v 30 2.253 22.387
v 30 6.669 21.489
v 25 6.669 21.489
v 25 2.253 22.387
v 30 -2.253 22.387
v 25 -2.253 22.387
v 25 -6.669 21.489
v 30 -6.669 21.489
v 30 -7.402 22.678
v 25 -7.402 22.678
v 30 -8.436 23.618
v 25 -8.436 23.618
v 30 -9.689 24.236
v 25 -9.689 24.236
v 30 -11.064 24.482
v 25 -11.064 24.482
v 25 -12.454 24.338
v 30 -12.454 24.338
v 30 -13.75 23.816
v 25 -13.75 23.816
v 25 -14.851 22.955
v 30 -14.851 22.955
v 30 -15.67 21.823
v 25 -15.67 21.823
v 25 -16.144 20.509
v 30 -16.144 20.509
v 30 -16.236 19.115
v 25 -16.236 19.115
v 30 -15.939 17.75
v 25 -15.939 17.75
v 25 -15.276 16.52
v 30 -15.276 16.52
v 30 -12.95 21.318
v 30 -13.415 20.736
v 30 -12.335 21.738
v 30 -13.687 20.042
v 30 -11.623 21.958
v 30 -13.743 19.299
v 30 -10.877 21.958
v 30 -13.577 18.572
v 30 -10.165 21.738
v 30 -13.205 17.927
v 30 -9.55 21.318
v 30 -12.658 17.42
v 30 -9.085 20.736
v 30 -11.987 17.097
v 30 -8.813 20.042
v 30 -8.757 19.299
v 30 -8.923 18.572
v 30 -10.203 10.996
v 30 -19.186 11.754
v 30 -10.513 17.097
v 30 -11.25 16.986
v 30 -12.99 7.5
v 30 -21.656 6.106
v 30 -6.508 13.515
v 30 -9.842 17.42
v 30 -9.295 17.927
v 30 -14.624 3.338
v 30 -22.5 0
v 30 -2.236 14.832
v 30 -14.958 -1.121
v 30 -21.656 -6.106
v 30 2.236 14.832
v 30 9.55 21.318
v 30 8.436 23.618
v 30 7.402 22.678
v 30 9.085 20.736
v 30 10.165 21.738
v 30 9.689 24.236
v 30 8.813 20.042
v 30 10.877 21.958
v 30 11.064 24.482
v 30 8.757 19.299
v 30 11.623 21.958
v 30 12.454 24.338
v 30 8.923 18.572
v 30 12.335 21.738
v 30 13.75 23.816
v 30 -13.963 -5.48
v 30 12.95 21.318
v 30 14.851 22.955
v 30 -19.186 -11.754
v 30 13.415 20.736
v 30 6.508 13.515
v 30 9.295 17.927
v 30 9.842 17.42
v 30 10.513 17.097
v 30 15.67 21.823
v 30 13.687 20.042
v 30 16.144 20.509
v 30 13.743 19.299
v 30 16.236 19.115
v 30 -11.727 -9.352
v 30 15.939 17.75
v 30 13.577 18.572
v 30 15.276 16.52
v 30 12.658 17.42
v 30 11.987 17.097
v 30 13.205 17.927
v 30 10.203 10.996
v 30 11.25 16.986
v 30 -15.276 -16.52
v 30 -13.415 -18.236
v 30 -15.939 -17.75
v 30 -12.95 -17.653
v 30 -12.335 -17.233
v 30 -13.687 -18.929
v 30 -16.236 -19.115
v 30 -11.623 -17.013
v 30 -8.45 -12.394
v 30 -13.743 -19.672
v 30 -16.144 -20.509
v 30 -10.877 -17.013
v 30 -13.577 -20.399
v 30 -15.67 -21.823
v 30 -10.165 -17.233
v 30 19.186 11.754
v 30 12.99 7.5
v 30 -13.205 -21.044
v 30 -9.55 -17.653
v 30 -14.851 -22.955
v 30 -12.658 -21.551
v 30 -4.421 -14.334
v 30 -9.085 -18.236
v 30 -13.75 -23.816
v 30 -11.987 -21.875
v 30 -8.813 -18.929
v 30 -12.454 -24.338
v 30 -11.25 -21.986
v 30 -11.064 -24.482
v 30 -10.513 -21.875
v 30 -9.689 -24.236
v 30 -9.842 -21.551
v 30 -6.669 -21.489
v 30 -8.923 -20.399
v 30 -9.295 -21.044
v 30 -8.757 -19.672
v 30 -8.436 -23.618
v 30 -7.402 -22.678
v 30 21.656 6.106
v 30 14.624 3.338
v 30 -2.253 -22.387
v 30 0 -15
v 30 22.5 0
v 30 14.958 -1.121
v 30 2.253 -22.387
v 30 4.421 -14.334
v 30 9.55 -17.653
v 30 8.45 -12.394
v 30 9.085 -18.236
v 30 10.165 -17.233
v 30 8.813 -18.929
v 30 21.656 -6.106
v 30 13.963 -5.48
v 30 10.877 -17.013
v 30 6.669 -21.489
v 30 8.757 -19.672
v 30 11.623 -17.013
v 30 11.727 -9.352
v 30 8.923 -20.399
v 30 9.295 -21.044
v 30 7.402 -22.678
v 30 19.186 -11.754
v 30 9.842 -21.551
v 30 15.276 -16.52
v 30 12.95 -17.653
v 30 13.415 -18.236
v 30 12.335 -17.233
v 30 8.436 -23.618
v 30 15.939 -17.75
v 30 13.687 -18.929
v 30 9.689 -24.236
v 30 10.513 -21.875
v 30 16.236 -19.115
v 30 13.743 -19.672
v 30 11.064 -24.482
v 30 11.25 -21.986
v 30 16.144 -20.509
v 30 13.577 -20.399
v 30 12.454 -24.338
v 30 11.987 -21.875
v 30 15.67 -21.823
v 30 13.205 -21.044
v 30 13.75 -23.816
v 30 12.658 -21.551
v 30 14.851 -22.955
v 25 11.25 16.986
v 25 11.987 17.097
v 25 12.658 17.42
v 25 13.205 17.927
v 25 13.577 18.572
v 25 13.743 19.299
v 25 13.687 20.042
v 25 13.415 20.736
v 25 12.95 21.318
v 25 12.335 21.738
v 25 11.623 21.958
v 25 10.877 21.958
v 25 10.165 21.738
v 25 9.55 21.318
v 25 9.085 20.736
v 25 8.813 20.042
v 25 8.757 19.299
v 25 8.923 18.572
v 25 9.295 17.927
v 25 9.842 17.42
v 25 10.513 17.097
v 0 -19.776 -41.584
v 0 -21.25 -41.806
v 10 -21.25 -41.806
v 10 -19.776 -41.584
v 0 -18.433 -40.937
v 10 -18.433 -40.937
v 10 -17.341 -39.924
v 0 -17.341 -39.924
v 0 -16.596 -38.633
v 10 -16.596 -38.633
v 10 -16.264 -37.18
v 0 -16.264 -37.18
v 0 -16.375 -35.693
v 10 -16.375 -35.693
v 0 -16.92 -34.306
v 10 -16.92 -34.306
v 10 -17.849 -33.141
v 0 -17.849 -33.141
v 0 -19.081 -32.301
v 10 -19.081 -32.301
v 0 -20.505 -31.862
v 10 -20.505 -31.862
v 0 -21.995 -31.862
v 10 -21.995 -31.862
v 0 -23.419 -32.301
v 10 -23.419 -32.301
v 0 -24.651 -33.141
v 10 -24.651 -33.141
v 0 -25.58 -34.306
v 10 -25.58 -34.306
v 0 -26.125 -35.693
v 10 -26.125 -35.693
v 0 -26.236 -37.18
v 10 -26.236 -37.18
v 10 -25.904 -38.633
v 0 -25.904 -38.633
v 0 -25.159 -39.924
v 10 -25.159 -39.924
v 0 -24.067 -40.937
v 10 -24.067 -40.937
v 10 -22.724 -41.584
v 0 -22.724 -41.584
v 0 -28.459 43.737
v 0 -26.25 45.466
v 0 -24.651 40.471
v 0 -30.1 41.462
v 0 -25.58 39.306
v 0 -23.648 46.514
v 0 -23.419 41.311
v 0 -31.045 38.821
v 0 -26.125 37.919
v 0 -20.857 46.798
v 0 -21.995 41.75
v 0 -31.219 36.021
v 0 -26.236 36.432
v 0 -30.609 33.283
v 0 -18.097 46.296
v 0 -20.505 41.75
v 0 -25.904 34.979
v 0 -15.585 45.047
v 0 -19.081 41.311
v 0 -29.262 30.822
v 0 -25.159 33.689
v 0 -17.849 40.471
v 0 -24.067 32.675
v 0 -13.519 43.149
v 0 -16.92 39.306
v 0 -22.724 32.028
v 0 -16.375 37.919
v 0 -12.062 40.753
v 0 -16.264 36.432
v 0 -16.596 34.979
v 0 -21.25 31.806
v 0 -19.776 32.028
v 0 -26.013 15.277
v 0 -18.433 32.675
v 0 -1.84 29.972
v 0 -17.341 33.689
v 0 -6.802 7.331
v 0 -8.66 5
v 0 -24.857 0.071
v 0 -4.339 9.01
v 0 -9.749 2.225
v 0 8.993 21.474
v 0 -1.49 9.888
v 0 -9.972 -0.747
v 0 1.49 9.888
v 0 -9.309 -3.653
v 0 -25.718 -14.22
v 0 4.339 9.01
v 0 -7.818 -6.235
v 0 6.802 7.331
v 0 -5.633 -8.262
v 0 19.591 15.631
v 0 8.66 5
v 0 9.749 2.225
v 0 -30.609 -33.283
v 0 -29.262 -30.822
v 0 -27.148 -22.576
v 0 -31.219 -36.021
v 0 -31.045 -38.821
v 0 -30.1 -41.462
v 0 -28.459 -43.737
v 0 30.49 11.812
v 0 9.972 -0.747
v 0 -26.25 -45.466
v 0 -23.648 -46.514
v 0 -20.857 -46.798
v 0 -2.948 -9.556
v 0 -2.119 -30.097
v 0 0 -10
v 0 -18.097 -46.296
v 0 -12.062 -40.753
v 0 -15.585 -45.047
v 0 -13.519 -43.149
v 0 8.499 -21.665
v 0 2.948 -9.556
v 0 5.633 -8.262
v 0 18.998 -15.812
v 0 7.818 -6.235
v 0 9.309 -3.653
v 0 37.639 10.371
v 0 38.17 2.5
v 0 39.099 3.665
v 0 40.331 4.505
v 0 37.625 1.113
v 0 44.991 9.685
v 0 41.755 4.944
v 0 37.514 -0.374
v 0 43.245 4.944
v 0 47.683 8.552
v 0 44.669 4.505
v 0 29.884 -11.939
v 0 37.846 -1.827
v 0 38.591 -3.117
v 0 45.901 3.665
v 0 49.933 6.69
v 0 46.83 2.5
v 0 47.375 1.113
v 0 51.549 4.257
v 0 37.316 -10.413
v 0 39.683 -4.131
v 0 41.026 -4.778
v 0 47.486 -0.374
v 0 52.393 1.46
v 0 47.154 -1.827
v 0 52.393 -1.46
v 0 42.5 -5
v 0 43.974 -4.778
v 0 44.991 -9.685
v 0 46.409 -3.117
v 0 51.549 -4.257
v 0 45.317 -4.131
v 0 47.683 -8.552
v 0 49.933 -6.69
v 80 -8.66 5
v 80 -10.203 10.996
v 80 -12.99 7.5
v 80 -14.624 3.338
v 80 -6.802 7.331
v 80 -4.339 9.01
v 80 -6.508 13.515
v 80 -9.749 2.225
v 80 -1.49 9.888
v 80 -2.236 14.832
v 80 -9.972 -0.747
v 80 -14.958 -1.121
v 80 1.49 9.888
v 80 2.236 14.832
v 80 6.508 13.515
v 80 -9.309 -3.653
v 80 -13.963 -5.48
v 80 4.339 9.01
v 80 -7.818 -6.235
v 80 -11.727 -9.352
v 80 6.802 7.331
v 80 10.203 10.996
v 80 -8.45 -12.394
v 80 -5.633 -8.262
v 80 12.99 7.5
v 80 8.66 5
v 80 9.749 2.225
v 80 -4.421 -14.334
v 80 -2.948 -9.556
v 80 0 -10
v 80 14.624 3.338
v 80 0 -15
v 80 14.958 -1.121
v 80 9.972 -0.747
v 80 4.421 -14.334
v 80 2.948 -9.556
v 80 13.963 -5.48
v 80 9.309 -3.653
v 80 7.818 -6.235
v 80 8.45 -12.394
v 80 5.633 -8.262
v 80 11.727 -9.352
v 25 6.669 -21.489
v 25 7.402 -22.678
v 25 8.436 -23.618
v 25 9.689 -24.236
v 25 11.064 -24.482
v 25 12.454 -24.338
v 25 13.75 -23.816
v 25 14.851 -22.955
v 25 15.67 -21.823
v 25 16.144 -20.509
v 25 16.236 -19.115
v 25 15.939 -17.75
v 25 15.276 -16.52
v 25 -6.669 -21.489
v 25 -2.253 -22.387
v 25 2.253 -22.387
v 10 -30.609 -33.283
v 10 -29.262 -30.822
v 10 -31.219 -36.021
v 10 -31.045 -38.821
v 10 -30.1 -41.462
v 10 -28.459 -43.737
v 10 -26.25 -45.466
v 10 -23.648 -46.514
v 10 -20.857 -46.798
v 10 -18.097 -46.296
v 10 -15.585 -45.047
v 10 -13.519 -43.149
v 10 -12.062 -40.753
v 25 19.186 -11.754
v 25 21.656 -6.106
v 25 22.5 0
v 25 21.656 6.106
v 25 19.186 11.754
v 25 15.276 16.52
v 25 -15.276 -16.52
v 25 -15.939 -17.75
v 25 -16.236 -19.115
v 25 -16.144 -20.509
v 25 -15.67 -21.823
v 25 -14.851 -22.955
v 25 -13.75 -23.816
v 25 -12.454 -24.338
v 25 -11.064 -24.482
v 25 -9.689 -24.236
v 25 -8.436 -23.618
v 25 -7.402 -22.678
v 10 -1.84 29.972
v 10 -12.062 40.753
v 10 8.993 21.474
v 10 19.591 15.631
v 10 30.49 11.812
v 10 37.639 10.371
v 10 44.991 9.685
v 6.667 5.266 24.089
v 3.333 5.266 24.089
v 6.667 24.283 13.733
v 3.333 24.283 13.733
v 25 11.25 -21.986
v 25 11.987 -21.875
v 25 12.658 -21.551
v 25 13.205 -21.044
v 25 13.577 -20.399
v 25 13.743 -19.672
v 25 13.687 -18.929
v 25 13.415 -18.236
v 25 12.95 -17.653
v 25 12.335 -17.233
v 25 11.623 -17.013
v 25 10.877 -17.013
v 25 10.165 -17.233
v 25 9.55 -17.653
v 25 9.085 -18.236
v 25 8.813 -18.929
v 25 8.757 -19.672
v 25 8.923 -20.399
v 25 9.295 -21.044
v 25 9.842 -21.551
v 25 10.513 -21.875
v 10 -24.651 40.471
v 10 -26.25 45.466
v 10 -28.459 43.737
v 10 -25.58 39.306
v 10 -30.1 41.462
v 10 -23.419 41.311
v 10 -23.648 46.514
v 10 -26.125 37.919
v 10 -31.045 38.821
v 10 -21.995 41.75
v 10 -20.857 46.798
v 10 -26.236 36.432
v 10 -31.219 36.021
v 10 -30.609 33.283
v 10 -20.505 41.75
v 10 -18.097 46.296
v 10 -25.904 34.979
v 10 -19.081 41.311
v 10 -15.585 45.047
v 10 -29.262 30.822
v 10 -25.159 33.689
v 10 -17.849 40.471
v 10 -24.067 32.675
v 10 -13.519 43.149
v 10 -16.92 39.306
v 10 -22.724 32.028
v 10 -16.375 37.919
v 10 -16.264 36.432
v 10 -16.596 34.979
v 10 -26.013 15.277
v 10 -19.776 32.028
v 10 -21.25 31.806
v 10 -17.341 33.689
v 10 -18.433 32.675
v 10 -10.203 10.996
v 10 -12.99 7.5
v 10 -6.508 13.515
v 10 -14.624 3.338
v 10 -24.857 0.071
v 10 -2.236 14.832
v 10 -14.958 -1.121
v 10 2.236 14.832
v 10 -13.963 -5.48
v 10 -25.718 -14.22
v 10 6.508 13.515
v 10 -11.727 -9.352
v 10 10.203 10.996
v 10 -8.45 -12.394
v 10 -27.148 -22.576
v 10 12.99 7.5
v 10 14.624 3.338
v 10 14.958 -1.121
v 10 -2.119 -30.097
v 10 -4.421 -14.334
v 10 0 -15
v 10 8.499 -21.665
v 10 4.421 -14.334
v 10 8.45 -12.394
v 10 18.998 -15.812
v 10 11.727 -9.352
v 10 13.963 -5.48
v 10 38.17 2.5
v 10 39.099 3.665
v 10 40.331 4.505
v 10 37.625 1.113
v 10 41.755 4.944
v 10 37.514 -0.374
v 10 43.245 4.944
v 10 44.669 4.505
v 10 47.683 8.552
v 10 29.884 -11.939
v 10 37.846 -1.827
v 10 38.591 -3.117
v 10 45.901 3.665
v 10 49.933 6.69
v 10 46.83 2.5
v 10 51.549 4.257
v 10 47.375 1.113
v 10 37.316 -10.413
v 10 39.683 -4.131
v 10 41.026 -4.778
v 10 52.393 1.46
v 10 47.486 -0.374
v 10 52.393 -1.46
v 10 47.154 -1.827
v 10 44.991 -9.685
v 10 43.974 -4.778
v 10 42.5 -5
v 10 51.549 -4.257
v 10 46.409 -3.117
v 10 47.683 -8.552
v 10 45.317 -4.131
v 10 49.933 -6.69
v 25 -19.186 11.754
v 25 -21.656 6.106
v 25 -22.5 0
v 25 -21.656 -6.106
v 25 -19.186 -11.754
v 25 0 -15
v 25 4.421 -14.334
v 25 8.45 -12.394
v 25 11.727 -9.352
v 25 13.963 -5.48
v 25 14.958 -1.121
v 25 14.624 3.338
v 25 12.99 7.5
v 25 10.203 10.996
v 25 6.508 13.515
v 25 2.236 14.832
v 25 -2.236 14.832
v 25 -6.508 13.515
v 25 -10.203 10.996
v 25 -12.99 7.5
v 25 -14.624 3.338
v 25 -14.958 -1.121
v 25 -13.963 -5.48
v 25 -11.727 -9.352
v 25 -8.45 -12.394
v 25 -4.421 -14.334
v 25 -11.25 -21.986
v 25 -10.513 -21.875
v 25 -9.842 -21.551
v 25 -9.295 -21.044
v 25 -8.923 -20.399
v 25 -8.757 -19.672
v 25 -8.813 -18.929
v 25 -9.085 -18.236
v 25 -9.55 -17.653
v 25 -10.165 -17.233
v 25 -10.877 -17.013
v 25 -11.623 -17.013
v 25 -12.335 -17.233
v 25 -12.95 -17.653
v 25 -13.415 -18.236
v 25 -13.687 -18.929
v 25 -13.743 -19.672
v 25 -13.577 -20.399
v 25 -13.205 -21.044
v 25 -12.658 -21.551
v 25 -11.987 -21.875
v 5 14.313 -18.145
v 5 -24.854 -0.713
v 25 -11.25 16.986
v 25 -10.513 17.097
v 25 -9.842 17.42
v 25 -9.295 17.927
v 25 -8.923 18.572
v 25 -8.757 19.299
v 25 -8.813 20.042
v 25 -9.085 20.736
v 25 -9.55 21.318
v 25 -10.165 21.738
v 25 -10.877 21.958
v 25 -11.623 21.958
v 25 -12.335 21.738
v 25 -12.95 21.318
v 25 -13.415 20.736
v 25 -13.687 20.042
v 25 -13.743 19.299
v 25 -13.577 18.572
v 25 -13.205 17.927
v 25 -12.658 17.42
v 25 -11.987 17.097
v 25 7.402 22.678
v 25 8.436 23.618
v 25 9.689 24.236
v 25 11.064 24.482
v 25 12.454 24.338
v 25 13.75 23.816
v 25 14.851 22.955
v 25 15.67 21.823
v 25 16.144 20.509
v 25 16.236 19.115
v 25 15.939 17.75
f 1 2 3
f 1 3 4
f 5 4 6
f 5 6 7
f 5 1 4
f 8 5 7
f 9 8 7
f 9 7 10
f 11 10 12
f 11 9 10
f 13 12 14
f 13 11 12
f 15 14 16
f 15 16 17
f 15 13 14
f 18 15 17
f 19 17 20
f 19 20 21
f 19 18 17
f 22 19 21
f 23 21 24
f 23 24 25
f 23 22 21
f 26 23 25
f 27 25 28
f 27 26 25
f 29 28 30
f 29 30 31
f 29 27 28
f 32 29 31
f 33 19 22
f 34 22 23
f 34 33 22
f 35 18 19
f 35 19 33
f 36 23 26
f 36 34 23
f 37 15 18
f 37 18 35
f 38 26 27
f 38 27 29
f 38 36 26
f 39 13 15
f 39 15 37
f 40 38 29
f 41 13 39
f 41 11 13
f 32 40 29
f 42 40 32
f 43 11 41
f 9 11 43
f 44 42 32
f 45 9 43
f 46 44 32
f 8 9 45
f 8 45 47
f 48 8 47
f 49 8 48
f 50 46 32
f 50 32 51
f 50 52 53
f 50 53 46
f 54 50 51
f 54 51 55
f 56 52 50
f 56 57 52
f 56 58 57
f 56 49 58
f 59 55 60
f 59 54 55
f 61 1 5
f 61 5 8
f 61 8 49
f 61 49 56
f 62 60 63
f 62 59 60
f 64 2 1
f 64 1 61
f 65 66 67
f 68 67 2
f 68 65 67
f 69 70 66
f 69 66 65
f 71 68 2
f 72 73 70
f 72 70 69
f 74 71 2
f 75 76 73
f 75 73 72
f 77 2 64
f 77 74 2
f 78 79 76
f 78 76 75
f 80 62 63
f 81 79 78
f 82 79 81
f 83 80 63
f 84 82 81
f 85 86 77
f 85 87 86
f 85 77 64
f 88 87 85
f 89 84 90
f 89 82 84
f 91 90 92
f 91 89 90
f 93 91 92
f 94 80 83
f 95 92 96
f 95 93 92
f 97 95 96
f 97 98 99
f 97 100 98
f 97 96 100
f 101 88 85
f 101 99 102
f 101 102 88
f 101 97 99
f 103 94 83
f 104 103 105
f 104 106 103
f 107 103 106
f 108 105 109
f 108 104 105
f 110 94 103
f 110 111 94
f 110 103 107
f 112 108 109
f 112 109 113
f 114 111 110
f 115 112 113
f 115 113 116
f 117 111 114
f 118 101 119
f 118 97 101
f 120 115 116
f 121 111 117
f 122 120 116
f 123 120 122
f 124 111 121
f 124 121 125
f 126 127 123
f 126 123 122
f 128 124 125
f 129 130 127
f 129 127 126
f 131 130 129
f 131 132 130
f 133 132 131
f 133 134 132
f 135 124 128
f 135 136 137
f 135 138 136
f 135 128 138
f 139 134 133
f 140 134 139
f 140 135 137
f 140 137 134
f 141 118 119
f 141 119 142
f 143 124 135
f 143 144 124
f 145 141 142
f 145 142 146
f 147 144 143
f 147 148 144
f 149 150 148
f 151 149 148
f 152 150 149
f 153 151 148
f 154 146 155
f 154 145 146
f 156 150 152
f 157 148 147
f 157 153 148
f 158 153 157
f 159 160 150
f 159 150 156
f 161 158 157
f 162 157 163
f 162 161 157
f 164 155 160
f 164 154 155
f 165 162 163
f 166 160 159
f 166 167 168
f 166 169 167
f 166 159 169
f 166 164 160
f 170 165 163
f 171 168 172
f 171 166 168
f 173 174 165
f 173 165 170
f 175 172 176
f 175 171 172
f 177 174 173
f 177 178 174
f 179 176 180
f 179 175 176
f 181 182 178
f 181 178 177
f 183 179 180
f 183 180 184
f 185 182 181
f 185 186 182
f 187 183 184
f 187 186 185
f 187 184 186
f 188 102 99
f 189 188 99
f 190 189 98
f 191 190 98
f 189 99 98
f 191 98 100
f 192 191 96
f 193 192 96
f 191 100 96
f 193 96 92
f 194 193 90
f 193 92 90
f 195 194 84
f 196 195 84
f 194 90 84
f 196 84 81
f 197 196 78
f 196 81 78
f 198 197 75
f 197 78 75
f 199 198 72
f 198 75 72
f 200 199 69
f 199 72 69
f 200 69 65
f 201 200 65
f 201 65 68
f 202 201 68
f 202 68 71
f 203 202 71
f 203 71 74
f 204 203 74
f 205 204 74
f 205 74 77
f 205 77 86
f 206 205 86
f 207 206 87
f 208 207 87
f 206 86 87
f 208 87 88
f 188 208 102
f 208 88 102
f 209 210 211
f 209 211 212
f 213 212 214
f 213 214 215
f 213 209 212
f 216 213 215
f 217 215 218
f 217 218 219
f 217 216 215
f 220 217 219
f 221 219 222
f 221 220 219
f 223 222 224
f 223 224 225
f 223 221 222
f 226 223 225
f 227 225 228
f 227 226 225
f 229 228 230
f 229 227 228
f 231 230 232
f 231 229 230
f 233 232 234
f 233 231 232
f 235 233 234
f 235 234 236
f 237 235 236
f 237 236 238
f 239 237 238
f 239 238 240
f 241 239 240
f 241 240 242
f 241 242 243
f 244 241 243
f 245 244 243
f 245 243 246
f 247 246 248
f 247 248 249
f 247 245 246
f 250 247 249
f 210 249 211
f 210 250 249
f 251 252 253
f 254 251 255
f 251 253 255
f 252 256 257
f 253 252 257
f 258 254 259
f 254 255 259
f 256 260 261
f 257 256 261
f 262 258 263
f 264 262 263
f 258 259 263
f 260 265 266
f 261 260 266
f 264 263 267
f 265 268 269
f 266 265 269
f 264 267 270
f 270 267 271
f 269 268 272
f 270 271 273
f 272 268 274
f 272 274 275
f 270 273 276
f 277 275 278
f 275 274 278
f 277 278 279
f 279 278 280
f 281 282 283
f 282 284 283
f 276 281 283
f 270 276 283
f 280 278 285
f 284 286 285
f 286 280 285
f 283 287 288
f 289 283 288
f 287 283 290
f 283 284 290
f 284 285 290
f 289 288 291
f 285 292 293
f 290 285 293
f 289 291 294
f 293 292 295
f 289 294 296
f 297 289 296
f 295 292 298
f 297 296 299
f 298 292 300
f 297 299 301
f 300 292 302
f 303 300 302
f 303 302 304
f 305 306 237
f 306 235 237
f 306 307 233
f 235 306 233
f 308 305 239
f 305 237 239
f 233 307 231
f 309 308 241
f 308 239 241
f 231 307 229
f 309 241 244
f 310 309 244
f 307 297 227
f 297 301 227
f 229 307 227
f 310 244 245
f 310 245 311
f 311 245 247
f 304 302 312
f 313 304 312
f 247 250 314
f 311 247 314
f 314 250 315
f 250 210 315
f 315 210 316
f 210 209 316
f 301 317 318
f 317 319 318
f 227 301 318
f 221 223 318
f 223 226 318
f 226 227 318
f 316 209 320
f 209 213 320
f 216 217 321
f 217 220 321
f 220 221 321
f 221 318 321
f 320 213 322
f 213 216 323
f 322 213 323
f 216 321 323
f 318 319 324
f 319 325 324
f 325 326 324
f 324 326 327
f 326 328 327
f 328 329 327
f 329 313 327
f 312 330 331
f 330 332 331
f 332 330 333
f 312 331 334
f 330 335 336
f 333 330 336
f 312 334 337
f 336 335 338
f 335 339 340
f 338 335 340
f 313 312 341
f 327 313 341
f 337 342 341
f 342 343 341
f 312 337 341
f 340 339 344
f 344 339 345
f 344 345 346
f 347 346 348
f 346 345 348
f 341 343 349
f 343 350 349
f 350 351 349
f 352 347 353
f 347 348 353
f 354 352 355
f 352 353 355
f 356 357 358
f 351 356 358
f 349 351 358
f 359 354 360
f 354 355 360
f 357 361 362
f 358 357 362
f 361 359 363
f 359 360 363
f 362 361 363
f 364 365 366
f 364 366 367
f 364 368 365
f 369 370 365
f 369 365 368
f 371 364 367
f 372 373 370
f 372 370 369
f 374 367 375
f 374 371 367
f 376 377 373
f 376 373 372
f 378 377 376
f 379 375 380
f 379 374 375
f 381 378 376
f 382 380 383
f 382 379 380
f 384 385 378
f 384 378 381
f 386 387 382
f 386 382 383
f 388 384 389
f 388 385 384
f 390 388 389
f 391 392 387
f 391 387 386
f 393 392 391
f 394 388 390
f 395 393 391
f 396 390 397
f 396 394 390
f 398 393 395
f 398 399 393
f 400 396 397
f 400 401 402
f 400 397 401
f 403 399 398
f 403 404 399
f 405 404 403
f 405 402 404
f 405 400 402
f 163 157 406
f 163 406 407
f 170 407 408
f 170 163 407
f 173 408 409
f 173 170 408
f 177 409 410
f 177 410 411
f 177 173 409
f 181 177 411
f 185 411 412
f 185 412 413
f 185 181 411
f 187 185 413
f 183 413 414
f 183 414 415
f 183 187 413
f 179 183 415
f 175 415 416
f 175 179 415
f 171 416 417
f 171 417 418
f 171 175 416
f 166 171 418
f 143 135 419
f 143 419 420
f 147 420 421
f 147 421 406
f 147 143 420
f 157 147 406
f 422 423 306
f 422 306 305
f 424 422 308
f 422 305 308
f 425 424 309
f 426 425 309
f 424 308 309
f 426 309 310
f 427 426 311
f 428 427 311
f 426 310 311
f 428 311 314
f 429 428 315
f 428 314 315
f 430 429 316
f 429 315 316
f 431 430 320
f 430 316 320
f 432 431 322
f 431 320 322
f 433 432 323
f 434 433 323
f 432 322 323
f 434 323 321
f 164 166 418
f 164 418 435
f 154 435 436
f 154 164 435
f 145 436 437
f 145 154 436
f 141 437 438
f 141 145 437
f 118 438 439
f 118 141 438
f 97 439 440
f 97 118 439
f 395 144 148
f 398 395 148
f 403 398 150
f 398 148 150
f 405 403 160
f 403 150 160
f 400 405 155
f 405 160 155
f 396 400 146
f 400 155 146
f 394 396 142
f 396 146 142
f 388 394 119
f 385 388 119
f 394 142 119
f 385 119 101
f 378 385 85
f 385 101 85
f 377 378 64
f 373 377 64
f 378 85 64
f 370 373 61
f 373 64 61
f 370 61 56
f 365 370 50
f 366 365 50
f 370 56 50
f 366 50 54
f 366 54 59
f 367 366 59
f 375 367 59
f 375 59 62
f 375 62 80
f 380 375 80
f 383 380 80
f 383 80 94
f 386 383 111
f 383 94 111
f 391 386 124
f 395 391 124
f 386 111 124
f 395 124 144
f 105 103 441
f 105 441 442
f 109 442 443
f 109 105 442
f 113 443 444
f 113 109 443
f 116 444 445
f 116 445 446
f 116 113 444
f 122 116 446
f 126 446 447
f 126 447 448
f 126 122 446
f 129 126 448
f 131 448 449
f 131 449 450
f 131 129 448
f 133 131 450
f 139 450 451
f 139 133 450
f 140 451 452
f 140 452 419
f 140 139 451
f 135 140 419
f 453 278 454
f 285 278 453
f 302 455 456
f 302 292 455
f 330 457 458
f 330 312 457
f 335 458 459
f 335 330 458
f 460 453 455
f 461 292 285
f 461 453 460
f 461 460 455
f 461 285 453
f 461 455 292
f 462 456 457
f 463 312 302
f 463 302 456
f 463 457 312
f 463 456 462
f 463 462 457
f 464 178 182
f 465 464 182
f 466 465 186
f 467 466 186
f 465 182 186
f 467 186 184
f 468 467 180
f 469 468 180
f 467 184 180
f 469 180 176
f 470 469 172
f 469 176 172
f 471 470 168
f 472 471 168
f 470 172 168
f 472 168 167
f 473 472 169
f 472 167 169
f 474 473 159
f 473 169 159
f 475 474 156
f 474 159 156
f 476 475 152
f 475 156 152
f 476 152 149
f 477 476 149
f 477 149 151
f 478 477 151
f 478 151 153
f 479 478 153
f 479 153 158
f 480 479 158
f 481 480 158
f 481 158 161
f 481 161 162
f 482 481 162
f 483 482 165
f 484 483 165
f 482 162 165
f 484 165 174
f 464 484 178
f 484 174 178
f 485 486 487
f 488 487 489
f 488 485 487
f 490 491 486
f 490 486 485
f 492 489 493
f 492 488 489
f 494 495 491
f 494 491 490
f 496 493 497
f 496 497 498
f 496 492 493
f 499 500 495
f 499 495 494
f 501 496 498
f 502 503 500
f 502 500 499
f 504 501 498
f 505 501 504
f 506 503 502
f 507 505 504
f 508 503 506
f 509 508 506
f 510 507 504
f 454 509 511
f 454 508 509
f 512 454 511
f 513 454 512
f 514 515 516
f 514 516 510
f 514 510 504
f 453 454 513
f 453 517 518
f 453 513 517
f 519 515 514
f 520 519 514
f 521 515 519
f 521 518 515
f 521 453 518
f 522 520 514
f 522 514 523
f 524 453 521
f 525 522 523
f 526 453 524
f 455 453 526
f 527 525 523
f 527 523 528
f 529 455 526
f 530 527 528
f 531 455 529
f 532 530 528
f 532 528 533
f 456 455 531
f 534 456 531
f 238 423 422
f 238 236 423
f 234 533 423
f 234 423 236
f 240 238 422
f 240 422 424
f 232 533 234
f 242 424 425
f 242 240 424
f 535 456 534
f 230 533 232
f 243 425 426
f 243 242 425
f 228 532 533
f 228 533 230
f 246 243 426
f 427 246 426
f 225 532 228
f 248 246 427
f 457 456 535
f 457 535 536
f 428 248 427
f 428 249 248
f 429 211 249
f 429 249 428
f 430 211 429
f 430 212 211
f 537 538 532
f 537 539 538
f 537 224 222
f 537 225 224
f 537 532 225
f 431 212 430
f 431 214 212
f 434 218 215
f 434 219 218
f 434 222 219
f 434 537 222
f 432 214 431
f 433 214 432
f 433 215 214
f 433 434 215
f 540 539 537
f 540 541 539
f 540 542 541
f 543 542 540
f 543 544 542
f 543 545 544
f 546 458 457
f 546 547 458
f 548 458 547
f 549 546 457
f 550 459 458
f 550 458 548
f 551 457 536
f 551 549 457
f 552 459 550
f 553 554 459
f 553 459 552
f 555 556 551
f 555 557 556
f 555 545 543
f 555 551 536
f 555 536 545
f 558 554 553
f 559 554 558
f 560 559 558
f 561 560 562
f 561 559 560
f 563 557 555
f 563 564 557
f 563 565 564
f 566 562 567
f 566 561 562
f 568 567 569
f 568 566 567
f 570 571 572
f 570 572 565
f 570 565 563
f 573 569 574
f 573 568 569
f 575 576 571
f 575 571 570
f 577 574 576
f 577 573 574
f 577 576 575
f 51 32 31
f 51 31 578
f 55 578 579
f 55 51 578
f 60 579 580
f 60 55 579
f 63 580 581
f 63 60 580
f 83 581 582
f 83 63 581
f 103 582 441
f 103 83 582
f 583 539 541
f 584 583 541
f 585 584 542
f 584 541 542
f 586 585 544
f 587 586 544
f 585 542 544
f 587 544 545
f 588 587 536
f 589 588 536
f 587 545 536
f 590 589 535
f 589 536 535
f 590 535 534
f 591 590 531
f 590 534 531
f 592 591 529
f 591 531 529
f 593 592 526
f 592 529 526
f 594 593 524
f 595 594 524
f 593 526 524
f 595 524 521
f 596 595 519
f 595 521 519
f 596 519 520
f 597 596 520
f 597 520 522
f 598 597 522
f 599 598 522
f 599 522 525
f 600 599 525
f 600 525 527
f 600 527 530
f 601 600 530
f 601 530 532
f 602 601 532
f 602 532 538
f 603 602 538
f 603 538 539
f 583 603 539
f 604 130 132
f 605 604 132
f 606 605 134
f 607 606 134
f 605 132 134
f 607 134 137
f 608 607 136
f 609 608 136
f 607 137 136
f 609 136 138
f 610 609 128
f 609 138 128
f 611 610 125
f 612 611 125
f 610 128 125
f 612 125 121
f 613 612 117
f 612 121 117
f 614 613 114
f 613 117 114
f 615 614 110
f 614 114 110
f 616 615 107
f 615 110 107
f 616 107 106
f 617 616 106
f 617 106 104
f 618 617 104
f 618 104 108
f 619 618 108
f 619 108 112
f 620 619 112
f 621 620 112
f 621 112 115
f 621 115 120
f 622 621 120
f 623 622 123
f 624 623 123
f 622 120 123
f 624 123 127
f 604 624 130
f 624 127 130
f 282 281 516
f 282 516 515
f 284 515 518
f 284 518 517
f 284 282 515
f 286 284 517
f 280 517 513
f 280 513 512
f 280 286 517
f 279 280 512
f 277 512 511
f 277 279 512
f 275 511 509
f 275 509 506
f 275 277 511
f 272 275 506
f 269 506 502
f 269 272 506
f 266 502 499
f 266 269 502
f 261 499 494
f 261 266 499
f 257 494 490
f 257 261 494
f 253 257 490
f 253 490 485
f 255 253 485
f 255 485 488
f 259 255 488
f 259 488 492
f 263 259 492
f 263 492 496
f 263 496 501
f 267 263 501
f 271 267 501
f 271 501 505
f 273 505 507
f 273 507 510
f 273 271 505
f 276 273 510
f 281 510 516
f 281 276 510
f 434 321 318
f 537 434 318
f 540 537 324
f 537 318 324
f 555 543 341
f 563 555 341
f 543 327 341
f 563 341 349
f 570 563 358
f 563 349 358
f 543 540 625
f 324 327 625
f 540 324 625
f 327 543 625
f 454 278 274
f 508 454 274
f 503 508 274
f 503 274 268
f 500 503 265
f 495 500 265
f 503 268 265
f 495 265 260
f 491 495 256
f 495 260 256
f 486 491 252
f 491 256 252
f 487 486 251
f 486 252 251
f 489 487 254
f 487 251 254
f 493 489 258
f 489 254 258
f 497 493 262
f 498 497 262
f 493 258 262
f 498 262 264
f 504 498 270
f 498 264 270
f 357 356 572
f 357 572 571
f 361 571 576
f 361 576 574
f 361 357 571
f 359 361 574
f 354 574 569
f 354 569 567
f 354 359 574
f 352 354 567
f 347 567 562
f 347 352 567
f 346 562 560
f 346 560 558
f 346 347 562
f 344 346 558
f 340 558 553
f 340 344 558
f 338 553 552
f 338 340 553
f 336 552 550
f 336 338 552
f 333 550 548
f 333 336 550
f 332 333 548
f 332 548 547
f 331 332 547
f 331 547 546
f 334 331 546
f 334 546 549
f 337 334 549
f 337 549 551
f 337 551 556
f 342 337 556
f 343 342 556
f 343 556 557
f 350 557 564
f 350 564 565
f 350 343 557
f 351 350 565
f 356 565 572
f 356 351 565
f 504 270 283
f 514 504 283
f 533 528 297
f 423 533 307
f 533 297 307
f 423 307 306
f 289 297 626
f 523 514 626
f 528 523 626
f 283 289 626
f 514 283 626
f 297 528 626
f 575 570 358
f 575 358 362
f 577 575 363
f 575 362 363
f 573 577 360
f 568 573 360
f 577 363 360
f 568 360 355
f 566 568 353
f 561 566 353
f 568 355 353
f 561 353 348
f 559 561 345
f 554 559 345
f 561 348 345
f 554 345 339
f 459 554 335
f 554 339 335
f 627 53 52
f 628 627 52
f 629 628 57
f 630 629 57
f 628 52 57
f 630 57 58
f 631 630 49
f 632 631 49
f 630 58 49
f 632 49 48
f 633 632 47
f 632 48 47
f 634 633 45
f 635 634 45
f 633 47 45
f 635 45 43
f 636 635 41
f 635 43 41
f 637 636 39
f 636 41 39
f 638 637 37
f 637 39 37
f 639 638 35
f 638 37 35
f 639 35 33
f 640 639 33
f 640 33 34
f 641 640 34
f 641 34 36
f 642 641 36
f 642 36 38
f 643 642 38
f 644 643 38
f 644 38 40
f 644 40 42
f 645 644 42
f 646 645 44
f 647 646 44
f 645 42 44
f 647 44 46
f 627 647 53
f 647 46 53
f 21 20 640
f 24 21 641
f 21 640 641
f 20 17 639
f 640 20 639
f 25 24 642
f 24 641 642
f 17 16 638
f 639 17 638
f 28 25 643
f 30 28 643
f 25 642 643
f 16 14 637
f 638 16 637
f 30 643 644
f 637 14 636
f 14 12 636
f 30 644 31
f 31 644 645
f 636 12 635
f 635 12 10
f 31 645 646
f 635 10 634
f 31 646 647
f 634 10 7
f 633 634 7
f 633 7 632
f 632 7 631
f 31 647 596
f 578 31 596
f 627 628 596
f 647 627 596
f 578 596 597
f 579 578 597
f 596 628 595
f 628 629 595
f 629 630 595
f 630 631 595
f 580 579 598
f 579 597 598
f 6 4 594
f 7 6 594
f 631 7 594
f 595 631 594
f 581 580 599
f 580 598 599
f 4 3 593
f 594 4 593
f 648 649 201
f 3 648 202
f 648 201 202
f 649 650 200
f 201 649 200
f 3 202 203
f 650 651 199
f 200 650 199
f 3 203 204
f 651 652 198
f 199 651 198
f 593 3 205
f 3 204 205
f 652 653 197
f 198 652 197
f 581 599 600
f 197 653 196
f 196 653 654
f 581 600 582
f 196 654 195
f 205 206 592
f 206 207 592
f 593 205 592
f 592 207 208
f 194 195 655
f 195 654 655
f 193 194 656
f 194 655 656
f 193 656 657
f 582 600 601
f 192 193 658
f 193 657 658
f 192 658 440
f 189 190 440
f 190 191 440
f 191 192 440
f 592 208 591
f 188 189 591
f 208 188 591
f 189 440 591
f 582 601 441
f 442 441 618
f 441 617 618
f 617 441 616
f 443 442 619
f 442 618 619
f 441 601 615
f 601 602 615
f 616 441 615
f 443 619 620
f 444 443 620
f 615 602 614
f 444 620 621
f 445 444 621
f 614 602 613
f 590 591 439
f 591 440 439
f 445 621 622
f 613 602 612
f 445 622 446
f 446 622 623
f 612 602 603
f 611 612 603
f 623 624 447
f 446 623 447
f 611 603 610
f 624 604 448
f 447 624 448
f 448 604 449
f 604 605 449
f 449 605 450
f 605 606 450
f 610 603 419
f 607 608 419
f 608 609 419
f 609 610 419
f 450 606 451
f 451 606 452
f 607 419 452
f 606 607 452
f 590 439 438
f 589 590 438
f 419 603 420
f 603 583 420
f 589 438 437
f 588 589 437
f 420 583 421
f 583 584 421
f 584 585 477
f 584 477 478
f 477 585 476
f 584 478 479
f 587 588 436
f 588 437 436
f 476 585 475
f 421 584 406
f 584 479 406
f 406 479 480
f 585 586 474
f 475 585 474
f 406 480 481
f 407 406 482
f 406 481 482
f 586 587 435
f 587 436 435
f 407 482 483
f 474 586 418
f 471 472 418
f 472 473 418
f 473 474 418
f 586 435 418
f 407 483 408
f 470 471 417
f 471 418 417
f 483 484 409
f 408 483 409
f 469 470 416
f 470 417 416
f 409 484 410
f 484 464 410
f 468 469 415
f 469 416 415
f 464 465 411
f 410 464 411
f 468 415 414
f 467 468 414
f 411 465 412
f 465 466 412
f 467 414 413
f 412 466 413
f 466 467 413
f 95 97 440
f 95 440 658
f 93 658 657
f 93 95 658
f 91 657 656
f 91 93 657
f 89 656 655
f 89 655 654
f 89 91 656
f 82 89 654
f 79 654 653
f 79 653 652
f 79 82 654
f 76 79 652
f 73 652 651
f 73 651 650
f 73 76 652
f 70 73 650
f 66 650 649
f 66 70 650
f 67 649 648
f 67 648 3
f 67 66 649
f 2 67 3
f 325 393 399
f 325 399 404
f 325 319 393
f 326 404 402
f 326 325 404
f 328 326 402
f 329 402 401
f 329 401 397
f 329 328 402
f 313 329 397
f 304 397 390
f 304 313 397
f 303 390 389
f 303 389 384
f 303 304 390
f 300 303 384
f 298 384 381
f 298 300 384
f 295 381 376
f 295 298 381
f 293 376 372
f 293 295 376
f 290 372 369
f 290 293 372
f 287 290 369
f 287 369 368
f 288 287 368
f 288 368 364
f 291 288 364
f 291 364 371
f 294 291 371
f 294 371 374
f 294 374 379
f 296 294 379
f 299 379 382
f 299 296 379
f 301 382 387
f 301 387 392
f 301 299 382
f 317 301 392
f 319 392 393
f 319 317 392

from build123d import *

# Parameters (mm, degrees)
SKETCH2_R           = 5
SKETCH2_R_2         = 10
BOSS_EXTRUDE2_DEPTH = 10
SKETCH3_R           = 15
SKETCH3_R_2         = 10
BOSS_EXTRUDE3_DEPTH = 20
SKETCH4_R           = 2.5
SKETCH4_R_2         = 15
BOSS_EXTRUDE5_DEPTH = 5
SKETCH5_R           = 15
SKETCH5_R_2         = 10
BOSS_EXTRUDE6_DEPTH = 50


with BuildPart() as part:
    # Sketch2 → Boss-Extrude2 (new body)
    with BuildSketch(Plane(origin=(0, 0, 0), x_dir=(0, 0, -1), z_dir=(1, 0, 0))):
        with BuildLine():
            ThreePointArc((9.684825363, 44.990814664), (8e-08, 52.5), (-9.684825323, 44.990814819))
            add(Edge.make_bspline(
                [(-40.752503599, -12.061652047), (-20.934905138, 4.420586079), (-10.579005904, 23.438067717), (-9.684825323, 44.990814819)],
                knots=[0, 0, 0, 0, 0.868352025, 0.868352025, 0.868352025, 0.868352025], degree=3))
            ThreePointArc((-40.752503599, -12.061652047), (-45.466333468, -26.2500004), (-30.821948144, -29.261876808))
            add(Edge.make_bspline(
                [(-30.821948144, -29.261876808), (1.426149217, -20.445917502), (30.821948237, -29.261876878)],
                knots=[0, 0, 0, 0.907199698, 0.907199698, 0.907199698], degree=2))
            ThreePointArc((30.821948237, -29.261876878), (45.466333568, -26.250000227), (40.752503338, -12.061651935))
            add(Edge.make_bspline(
                [(40.752503338, -12.061651935), (11.072313354, 12.162082971), (9.684825363, 44.990814664)],
                knots=[0, 0, 0, 1, 1, 1], degree=2))
        make_face()
        with Locations((0, 42.5)):
            Circle(SKETCH2_R, mode=Mode.SUBTRACT)
        with Locations((36.806079661, -21.25)):
            Circle(SKETCH2_R, mode=Mode.SUBTRACT)
        with Locations((-36.806079661, -21.25)):
            Circle(SKETCH2_R, mode=Mode.SUBTRACT)
        Circle(SKETCH2_R_2, mode=Mode.SUBTRACT)
    extrude(amount=BOSS_EXTRUDE2_DEPTH)

    # Sketch3 → Boss-Extrude3 (add)
    with BuildSketch(Plane(origin=(10, 0, 0), x_dir=(0, 0, -1), z_dir=(1, 0, 0))):
        Circle(SKETCH3_R)
        Circle(SKETCH3_R_2, mode=Mode.SUBTRACT)
    extrude(amount=BOSS_EXTRUDE3_DEPTH)

    # Sketch4 → Boss-Extrude5 (add)
    with BuildSketch(Plane(origin=(30, 0, 0), x_dir=(0, 0, -1), z_dir=(1, 0, 0))):
        with BuildLine():
            ThreePointArc((21.488966336, 6.668907393), (23.815698604, 13.75), (16.519926386, 15.275537051))
            ThreePointArc((16.519926386, 15.275537051), (0, 22.5), (-16.519926386, 15.275537051))
            ThreePointArc((-16.519926386, 15.275537051), (-23.815698604, 13.75), (-21.488966336, 6.668907393))
            ThreePointArc((-21.488966336, 6.668907393), (-22.5, 0), (-21.488966336, -6.668907393))
            ThreePointArc((-21.488966336, -6.668907393), (-23.815698604, -13.75), (-16.519926386, -15.275537051))
            ThreePointArc((-16.519926386, -15.275537051), (0, -22.5), (16.519926386, -15.275537051))
            ThreePointArc((16.519926386, -15.275537051), (23.815698604, -13.75), (21.488966336, -6.668907393))
            ThreePointArc((21.488966336, -6.668907393), (22.5, 0), (21.488966336, 6.668907393))
        make_face()
        with Locations((19.485571585, 11.25)):
            Circle(SKETCH4_R, mode=Mode.SUBTRACT)
        with Locations((19.485571585, -11.25)):
            Circle(SKETCH4_R, mode=Mode.SUBTRACT)
        with Locations((-19.485571585, -11.25)):
            Circle(SKETCH4_R, mode=Mode.SUBTRACT)
        with Locations((-19.485571585, 11.25)):
            Circle(SKETCH4_R, mode=Mode.SUBTRACT)
        Circle(SKETCH4_R_2, mode=Mode.SUBTRACT)
    extrude(amount=-BOSS_EXTRUDE5_DEPTH)

    # Sketch5 → Boss-Extrude6 (add)
    with BuildSketch(Plane(origin=(30, 0, 0), x_dir=(0, 0, -1), z_dir=(1, 0, 0))):
        Circle(SKETCH5_R)
        Circle(SKETCH5_R_2, mode=Mode.SUBTRACT)
    extrude(amount=BOSS_EXTRUDE6_DEPTH)


solid = part.part
